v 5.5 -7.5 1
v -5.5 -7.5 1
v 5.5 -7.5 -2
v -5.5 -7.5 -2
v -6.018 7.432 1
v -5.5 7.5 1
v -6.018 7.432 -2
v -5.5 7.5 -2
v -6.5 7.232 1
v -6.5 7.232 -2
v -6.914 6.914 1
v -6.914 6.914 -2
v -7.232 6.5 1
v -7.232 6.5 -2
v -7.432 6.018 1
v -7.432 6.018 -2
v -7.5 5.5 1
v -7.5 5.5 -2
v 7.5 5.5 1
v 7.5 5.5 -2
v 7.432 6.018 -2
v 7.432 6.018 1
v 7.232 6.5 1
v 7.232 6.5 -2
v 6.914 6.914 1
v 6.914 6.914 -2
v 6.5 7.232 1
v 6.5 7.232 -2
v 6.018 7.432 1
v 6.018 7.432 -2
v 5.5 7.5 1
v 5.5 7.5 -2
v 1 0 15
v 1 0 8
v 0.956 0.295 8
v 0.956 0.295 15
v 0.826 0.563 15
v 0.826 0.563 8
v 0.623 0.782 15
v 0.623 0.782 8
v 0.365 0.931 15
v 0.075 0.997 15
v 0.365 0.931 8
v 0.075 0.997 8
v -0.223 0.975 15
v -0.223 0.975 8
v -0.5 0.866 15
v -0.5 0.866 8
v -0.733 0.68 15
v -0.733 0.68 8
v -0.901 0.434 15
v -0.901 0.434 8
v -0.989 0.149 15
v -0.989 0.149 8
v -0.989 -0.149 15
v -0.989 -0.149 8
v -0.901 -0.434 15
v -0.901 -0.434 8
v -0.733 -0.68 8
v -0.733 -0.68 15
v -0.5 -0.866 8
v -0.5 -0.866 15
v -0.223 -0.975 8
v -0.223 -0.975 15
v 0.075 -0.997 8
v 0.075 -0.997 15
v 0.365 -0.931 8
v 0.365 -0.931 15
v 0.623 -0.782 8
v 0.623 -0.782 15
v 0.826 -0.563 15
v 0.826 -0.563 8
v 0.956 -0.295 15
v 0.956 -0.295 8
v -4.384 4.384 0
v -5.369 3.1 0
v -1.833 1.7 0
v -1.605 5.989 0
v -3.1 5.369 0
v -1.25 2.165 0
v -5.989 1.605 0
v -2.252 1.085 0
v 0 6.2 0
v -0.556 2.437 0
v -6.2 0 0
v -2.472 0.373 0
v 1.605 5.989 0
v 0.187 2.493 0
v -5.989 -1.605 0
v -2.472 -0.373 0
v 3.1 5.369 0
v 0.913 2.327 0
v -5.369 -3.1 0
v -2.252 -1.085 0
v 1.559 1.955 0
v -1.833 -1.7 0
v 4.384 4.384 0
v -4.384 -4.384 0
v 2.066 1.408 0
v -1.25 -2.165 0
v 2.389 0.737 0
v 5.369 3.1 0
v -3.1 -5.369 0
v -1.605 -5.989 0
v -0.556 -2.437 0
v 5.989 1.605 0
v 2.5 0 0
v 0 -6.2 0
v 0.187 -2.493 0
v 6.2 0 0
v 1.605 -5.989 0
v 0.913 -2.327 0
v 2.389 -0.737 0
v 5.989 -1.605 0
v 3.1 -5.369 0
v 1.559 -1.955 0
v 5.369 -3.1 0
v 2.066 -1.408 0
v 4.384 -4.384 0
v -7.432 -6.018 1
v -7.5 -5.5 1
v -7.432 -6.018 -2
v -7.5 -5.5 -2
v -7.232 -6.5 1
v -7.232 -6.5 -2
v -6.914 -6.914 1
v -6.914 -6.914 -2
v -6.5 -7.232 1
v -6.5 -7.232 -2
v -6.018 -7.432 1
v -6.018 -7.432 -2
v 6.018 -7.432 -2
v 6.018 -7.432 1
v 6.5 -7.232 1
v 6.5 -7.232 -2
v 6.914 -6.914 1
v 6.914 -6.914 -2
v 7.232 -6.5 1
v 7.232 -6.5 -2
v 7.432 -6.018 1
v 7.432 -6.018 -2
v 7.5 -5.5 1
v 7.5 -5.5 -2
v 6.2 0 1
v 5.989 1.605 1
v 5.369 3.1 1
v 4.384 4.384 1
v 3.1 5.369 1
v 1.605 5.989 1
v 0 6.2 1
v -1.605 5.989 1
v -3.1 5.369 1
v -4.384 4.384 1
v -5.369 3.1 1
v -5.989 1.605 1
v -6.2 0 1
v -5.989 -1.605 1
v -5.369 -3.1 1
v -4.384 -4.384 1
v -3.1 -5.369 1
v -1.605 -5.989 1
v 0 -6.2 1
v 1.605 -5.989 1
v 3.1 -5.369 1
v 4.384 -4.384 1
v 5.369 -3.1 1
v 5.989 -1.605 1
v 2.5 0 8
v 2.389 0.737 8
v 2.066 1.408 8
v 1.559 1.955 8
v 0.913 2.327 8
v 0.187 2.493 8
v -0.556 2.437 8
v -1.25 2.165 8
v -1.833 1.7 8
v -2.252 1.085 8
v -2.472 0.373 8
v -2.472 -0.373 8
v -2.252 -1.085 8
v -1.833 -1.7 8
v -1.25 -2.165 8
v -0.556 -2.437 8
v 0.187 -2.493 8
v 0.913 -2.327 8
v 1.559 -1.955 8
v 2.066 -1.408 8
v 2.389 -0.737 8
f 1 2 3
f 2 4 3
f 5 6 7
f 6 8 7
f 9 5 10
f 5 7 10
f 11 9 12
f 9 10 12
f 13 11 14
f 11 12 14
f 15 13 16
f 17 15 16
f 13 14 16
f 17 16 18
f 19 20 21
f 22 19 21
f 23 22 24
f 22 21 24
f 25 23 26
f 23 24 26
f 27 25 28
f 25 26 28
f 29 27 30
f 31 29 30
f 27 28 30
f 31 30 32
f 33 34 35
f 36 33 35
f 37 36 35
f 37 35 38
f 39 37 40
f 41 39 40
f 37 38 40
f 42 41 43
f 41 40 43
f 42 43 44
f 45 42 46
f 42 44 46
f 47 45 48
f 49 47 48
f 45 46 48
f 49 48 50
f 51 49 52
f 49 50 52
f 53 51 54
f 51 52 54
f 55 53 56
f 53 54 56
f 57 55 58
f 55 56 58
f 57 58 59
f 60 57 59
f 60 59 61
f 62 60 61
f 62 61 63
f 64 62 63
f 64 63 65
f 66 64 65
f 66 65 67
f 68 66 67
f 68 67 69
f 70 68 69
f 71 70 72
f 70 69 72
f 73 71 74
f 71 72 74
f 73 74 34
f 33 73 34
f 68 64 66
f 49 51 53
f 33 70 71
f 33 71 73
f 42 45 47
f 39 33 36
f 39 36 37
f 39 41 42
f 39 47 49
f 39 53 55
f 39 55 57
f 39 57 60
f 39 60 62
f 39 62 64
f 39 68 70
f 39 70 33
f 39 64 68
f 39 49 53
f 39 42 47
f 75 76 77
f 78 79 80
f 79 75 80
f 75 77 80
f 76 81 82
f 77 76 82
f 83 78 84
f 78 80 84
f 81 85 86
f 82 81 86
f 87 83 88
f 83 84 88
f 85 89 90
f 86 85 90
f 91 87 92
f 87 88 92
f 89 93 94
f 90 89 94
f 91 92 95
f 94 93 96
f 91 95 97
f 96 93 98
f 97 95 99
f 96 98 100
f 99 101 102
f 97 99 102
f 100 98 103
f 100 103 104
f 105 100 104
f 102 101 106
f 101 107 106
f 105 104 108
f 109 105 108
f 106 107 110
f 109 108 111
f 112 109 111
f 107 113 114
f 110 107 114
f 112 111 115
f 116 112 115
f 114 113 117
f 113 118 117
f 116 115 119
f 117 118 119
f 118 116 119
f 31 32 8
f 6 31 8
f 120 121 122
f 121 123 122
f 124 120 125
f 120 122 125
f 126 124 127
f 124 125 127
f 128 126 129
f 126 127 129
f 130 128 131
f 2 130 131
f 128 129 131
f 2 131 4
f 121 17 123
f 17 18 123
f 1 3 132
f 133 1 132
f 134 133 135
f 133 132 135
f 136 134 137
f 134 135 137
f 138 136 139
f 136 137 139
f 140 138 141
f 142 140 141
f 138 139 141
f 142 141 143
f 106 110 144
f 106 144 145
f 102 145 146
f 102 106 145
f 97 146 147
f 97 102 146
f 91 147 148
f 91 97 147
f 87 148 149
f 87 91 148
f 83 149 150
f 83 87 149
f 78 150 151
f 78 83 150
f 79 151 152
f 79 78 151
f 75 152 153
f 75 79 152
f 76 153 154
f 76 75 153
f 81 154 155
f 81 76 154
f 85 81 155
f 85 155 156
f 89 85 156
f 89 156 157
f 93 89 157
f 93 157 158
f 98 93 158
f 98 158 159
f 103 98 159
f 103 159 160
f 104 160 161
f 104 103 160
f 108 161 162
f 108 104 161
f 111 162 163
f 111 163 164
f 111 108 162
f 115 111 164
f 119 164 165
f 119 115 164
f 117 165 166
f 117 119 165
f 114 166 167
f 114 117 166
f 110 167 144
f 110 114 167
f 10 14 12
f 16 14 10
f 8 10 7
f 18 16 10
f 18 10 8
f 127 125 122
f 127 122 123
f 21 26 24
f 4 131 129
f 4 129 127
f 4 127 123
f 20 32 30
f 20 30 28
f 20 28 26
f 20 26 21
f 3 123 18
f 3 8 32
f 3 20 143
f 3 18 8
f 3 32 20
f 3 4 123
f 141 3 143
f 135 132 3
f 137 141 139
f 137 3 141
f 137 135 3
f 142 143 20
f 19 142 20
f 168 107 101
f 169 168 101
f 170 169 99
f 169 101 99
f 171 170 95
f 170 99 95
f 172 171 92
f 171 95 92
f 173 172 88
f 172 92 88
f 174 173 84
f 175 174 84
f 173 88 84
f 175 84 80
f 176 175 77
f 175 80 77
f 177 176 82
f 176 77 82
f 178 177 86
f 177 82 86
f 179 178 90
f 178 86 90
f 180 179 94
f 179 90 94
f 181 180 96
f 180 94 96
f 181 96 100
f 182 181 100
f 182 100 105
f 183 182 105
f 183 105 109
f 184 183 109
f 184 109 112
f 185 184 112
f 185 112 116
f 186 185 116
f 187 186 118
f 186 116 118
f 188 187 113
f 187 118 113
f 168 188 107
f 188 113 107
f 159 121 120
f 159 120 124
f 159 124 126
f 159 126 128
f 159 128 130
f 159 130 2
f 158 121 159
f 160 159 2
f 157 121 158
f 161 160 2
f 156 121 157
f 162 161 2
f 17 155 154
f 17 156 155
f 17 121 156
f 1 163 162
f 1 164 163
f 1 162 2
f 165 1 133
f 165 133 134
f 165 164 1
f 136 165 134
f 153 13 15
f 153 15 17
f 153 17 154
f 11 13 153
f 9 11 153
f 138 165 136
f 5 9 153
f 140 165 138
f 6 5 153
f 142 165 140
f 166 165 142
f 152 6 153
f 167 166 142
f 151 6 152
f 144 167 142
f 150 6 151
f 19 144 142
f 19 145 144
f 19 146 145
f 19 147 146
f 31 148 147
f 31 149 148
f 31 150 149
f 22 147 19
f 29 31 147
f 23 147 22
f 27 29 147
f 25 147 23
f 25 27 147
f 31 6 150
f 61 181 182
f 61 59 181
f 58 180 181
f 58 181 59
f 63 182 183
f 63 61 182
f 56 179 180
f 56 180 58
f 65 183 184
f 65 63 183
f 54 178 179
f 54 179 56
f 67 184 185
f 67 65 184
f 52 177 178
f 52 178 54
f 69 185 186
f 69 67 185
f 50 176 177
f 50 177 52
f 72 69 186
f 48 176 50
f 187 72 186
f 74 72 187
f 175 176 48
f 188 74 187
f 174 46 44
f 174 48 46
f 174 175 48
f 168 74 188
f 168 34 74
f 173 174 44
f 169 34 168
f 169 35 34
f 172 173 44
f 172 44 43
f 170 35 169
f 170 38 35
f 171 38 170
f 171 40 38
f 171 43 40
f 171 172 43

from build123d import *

# Parameters (mm, degrees)
F0_R     = 2.5
F1_DEPTH = 8
F2_R     = 1
F3_DEPTH = 7
F4_R     = 2.5
F5_DEPTH = 2
F6_R     = 6.2
F7_DEPTH = 1


with BuildPart() as f1:
    # F0 (on Top) → F1 (new body)
    with BuildSketch(Plane.XY):
        Circle(F0_R)
    extrude(amount=F1_DEPTH)

    # F2 (on face) → F3 (join)
    with BuildSketch(Plane.XY.offset(8)):
        Circle(F2_R)
    extrude(amount=F3_DEPTH)

    # F4 (on face) → F5 (join)
    with BuildSketch(Plane(origin=(0, 0, 0), x_dir=(1, 0, 0), z_dir=(0, 0, -1))):
        with BuildLine():
            Line((5.5, 7.5), (-5.5, 7.5))
            ThreePointArc((-5.5, 7.5), (-6.9142135624, 6.9142135624), (-7.5, 5.5))
            Line((-7.5, 5.5), (-7.5, -5.5))
            ThreePointArc((-7.5, -5.5), (-6.9142135624, -6.9142135624), (-5.5, -7.5))
            Line((-5.5, -7.5), (5.5, -7.5))
            ThreePointArc((5.5, -7.5), (6.9142135624, -6.9142135624), (7.5, -5.5))
            Line((7.5, -5.5), (7.5, 5.5))
            ThreePointArc((7.5, 5.5), (6.9142135624, 6.9142135624), (5.5, 7.5))
        make_face()
        Circle(F4_R, mode=Mode.SUBTRACT)
        Circle(F4_R)
    extrude(amount=F5_DEPTH)

    # F6 (on face) → F7 (join)
    with BuildSketch(Plane.XY):
        with BuildLine():
            Line((5.5, 7.5), (-5.5, 7.5))
            ThreePointArc((-5.5, 7.5), (-6.9142135624, 6.9142135624), (-7.5, 5.5))
            Line((-7.5, 5.5), (-7.5, -5.5))
            ThreePointArc((-7.5, -5.5), (-6.9142135624, -6.9142135624), (-5.5, -7.5))
            Line((-5.5, -7.5), (5.5, -7.5))
            ThreePointArc((5.5, -7.5), (6.9142135624, -6.9142135624), (7.5, -5.5))
            Line((7.5, -5.5), (7.5, 5.5))
            ThreePointArc((7.5, 5.5), (6.9142135624, 6.9142135624), (5.5, 7.5))
        make_face()
        Circle(F6_R, mode=Mode.SUBTRACT)
    extrude(amount=F7_DEPTH)


solid = f1.part
